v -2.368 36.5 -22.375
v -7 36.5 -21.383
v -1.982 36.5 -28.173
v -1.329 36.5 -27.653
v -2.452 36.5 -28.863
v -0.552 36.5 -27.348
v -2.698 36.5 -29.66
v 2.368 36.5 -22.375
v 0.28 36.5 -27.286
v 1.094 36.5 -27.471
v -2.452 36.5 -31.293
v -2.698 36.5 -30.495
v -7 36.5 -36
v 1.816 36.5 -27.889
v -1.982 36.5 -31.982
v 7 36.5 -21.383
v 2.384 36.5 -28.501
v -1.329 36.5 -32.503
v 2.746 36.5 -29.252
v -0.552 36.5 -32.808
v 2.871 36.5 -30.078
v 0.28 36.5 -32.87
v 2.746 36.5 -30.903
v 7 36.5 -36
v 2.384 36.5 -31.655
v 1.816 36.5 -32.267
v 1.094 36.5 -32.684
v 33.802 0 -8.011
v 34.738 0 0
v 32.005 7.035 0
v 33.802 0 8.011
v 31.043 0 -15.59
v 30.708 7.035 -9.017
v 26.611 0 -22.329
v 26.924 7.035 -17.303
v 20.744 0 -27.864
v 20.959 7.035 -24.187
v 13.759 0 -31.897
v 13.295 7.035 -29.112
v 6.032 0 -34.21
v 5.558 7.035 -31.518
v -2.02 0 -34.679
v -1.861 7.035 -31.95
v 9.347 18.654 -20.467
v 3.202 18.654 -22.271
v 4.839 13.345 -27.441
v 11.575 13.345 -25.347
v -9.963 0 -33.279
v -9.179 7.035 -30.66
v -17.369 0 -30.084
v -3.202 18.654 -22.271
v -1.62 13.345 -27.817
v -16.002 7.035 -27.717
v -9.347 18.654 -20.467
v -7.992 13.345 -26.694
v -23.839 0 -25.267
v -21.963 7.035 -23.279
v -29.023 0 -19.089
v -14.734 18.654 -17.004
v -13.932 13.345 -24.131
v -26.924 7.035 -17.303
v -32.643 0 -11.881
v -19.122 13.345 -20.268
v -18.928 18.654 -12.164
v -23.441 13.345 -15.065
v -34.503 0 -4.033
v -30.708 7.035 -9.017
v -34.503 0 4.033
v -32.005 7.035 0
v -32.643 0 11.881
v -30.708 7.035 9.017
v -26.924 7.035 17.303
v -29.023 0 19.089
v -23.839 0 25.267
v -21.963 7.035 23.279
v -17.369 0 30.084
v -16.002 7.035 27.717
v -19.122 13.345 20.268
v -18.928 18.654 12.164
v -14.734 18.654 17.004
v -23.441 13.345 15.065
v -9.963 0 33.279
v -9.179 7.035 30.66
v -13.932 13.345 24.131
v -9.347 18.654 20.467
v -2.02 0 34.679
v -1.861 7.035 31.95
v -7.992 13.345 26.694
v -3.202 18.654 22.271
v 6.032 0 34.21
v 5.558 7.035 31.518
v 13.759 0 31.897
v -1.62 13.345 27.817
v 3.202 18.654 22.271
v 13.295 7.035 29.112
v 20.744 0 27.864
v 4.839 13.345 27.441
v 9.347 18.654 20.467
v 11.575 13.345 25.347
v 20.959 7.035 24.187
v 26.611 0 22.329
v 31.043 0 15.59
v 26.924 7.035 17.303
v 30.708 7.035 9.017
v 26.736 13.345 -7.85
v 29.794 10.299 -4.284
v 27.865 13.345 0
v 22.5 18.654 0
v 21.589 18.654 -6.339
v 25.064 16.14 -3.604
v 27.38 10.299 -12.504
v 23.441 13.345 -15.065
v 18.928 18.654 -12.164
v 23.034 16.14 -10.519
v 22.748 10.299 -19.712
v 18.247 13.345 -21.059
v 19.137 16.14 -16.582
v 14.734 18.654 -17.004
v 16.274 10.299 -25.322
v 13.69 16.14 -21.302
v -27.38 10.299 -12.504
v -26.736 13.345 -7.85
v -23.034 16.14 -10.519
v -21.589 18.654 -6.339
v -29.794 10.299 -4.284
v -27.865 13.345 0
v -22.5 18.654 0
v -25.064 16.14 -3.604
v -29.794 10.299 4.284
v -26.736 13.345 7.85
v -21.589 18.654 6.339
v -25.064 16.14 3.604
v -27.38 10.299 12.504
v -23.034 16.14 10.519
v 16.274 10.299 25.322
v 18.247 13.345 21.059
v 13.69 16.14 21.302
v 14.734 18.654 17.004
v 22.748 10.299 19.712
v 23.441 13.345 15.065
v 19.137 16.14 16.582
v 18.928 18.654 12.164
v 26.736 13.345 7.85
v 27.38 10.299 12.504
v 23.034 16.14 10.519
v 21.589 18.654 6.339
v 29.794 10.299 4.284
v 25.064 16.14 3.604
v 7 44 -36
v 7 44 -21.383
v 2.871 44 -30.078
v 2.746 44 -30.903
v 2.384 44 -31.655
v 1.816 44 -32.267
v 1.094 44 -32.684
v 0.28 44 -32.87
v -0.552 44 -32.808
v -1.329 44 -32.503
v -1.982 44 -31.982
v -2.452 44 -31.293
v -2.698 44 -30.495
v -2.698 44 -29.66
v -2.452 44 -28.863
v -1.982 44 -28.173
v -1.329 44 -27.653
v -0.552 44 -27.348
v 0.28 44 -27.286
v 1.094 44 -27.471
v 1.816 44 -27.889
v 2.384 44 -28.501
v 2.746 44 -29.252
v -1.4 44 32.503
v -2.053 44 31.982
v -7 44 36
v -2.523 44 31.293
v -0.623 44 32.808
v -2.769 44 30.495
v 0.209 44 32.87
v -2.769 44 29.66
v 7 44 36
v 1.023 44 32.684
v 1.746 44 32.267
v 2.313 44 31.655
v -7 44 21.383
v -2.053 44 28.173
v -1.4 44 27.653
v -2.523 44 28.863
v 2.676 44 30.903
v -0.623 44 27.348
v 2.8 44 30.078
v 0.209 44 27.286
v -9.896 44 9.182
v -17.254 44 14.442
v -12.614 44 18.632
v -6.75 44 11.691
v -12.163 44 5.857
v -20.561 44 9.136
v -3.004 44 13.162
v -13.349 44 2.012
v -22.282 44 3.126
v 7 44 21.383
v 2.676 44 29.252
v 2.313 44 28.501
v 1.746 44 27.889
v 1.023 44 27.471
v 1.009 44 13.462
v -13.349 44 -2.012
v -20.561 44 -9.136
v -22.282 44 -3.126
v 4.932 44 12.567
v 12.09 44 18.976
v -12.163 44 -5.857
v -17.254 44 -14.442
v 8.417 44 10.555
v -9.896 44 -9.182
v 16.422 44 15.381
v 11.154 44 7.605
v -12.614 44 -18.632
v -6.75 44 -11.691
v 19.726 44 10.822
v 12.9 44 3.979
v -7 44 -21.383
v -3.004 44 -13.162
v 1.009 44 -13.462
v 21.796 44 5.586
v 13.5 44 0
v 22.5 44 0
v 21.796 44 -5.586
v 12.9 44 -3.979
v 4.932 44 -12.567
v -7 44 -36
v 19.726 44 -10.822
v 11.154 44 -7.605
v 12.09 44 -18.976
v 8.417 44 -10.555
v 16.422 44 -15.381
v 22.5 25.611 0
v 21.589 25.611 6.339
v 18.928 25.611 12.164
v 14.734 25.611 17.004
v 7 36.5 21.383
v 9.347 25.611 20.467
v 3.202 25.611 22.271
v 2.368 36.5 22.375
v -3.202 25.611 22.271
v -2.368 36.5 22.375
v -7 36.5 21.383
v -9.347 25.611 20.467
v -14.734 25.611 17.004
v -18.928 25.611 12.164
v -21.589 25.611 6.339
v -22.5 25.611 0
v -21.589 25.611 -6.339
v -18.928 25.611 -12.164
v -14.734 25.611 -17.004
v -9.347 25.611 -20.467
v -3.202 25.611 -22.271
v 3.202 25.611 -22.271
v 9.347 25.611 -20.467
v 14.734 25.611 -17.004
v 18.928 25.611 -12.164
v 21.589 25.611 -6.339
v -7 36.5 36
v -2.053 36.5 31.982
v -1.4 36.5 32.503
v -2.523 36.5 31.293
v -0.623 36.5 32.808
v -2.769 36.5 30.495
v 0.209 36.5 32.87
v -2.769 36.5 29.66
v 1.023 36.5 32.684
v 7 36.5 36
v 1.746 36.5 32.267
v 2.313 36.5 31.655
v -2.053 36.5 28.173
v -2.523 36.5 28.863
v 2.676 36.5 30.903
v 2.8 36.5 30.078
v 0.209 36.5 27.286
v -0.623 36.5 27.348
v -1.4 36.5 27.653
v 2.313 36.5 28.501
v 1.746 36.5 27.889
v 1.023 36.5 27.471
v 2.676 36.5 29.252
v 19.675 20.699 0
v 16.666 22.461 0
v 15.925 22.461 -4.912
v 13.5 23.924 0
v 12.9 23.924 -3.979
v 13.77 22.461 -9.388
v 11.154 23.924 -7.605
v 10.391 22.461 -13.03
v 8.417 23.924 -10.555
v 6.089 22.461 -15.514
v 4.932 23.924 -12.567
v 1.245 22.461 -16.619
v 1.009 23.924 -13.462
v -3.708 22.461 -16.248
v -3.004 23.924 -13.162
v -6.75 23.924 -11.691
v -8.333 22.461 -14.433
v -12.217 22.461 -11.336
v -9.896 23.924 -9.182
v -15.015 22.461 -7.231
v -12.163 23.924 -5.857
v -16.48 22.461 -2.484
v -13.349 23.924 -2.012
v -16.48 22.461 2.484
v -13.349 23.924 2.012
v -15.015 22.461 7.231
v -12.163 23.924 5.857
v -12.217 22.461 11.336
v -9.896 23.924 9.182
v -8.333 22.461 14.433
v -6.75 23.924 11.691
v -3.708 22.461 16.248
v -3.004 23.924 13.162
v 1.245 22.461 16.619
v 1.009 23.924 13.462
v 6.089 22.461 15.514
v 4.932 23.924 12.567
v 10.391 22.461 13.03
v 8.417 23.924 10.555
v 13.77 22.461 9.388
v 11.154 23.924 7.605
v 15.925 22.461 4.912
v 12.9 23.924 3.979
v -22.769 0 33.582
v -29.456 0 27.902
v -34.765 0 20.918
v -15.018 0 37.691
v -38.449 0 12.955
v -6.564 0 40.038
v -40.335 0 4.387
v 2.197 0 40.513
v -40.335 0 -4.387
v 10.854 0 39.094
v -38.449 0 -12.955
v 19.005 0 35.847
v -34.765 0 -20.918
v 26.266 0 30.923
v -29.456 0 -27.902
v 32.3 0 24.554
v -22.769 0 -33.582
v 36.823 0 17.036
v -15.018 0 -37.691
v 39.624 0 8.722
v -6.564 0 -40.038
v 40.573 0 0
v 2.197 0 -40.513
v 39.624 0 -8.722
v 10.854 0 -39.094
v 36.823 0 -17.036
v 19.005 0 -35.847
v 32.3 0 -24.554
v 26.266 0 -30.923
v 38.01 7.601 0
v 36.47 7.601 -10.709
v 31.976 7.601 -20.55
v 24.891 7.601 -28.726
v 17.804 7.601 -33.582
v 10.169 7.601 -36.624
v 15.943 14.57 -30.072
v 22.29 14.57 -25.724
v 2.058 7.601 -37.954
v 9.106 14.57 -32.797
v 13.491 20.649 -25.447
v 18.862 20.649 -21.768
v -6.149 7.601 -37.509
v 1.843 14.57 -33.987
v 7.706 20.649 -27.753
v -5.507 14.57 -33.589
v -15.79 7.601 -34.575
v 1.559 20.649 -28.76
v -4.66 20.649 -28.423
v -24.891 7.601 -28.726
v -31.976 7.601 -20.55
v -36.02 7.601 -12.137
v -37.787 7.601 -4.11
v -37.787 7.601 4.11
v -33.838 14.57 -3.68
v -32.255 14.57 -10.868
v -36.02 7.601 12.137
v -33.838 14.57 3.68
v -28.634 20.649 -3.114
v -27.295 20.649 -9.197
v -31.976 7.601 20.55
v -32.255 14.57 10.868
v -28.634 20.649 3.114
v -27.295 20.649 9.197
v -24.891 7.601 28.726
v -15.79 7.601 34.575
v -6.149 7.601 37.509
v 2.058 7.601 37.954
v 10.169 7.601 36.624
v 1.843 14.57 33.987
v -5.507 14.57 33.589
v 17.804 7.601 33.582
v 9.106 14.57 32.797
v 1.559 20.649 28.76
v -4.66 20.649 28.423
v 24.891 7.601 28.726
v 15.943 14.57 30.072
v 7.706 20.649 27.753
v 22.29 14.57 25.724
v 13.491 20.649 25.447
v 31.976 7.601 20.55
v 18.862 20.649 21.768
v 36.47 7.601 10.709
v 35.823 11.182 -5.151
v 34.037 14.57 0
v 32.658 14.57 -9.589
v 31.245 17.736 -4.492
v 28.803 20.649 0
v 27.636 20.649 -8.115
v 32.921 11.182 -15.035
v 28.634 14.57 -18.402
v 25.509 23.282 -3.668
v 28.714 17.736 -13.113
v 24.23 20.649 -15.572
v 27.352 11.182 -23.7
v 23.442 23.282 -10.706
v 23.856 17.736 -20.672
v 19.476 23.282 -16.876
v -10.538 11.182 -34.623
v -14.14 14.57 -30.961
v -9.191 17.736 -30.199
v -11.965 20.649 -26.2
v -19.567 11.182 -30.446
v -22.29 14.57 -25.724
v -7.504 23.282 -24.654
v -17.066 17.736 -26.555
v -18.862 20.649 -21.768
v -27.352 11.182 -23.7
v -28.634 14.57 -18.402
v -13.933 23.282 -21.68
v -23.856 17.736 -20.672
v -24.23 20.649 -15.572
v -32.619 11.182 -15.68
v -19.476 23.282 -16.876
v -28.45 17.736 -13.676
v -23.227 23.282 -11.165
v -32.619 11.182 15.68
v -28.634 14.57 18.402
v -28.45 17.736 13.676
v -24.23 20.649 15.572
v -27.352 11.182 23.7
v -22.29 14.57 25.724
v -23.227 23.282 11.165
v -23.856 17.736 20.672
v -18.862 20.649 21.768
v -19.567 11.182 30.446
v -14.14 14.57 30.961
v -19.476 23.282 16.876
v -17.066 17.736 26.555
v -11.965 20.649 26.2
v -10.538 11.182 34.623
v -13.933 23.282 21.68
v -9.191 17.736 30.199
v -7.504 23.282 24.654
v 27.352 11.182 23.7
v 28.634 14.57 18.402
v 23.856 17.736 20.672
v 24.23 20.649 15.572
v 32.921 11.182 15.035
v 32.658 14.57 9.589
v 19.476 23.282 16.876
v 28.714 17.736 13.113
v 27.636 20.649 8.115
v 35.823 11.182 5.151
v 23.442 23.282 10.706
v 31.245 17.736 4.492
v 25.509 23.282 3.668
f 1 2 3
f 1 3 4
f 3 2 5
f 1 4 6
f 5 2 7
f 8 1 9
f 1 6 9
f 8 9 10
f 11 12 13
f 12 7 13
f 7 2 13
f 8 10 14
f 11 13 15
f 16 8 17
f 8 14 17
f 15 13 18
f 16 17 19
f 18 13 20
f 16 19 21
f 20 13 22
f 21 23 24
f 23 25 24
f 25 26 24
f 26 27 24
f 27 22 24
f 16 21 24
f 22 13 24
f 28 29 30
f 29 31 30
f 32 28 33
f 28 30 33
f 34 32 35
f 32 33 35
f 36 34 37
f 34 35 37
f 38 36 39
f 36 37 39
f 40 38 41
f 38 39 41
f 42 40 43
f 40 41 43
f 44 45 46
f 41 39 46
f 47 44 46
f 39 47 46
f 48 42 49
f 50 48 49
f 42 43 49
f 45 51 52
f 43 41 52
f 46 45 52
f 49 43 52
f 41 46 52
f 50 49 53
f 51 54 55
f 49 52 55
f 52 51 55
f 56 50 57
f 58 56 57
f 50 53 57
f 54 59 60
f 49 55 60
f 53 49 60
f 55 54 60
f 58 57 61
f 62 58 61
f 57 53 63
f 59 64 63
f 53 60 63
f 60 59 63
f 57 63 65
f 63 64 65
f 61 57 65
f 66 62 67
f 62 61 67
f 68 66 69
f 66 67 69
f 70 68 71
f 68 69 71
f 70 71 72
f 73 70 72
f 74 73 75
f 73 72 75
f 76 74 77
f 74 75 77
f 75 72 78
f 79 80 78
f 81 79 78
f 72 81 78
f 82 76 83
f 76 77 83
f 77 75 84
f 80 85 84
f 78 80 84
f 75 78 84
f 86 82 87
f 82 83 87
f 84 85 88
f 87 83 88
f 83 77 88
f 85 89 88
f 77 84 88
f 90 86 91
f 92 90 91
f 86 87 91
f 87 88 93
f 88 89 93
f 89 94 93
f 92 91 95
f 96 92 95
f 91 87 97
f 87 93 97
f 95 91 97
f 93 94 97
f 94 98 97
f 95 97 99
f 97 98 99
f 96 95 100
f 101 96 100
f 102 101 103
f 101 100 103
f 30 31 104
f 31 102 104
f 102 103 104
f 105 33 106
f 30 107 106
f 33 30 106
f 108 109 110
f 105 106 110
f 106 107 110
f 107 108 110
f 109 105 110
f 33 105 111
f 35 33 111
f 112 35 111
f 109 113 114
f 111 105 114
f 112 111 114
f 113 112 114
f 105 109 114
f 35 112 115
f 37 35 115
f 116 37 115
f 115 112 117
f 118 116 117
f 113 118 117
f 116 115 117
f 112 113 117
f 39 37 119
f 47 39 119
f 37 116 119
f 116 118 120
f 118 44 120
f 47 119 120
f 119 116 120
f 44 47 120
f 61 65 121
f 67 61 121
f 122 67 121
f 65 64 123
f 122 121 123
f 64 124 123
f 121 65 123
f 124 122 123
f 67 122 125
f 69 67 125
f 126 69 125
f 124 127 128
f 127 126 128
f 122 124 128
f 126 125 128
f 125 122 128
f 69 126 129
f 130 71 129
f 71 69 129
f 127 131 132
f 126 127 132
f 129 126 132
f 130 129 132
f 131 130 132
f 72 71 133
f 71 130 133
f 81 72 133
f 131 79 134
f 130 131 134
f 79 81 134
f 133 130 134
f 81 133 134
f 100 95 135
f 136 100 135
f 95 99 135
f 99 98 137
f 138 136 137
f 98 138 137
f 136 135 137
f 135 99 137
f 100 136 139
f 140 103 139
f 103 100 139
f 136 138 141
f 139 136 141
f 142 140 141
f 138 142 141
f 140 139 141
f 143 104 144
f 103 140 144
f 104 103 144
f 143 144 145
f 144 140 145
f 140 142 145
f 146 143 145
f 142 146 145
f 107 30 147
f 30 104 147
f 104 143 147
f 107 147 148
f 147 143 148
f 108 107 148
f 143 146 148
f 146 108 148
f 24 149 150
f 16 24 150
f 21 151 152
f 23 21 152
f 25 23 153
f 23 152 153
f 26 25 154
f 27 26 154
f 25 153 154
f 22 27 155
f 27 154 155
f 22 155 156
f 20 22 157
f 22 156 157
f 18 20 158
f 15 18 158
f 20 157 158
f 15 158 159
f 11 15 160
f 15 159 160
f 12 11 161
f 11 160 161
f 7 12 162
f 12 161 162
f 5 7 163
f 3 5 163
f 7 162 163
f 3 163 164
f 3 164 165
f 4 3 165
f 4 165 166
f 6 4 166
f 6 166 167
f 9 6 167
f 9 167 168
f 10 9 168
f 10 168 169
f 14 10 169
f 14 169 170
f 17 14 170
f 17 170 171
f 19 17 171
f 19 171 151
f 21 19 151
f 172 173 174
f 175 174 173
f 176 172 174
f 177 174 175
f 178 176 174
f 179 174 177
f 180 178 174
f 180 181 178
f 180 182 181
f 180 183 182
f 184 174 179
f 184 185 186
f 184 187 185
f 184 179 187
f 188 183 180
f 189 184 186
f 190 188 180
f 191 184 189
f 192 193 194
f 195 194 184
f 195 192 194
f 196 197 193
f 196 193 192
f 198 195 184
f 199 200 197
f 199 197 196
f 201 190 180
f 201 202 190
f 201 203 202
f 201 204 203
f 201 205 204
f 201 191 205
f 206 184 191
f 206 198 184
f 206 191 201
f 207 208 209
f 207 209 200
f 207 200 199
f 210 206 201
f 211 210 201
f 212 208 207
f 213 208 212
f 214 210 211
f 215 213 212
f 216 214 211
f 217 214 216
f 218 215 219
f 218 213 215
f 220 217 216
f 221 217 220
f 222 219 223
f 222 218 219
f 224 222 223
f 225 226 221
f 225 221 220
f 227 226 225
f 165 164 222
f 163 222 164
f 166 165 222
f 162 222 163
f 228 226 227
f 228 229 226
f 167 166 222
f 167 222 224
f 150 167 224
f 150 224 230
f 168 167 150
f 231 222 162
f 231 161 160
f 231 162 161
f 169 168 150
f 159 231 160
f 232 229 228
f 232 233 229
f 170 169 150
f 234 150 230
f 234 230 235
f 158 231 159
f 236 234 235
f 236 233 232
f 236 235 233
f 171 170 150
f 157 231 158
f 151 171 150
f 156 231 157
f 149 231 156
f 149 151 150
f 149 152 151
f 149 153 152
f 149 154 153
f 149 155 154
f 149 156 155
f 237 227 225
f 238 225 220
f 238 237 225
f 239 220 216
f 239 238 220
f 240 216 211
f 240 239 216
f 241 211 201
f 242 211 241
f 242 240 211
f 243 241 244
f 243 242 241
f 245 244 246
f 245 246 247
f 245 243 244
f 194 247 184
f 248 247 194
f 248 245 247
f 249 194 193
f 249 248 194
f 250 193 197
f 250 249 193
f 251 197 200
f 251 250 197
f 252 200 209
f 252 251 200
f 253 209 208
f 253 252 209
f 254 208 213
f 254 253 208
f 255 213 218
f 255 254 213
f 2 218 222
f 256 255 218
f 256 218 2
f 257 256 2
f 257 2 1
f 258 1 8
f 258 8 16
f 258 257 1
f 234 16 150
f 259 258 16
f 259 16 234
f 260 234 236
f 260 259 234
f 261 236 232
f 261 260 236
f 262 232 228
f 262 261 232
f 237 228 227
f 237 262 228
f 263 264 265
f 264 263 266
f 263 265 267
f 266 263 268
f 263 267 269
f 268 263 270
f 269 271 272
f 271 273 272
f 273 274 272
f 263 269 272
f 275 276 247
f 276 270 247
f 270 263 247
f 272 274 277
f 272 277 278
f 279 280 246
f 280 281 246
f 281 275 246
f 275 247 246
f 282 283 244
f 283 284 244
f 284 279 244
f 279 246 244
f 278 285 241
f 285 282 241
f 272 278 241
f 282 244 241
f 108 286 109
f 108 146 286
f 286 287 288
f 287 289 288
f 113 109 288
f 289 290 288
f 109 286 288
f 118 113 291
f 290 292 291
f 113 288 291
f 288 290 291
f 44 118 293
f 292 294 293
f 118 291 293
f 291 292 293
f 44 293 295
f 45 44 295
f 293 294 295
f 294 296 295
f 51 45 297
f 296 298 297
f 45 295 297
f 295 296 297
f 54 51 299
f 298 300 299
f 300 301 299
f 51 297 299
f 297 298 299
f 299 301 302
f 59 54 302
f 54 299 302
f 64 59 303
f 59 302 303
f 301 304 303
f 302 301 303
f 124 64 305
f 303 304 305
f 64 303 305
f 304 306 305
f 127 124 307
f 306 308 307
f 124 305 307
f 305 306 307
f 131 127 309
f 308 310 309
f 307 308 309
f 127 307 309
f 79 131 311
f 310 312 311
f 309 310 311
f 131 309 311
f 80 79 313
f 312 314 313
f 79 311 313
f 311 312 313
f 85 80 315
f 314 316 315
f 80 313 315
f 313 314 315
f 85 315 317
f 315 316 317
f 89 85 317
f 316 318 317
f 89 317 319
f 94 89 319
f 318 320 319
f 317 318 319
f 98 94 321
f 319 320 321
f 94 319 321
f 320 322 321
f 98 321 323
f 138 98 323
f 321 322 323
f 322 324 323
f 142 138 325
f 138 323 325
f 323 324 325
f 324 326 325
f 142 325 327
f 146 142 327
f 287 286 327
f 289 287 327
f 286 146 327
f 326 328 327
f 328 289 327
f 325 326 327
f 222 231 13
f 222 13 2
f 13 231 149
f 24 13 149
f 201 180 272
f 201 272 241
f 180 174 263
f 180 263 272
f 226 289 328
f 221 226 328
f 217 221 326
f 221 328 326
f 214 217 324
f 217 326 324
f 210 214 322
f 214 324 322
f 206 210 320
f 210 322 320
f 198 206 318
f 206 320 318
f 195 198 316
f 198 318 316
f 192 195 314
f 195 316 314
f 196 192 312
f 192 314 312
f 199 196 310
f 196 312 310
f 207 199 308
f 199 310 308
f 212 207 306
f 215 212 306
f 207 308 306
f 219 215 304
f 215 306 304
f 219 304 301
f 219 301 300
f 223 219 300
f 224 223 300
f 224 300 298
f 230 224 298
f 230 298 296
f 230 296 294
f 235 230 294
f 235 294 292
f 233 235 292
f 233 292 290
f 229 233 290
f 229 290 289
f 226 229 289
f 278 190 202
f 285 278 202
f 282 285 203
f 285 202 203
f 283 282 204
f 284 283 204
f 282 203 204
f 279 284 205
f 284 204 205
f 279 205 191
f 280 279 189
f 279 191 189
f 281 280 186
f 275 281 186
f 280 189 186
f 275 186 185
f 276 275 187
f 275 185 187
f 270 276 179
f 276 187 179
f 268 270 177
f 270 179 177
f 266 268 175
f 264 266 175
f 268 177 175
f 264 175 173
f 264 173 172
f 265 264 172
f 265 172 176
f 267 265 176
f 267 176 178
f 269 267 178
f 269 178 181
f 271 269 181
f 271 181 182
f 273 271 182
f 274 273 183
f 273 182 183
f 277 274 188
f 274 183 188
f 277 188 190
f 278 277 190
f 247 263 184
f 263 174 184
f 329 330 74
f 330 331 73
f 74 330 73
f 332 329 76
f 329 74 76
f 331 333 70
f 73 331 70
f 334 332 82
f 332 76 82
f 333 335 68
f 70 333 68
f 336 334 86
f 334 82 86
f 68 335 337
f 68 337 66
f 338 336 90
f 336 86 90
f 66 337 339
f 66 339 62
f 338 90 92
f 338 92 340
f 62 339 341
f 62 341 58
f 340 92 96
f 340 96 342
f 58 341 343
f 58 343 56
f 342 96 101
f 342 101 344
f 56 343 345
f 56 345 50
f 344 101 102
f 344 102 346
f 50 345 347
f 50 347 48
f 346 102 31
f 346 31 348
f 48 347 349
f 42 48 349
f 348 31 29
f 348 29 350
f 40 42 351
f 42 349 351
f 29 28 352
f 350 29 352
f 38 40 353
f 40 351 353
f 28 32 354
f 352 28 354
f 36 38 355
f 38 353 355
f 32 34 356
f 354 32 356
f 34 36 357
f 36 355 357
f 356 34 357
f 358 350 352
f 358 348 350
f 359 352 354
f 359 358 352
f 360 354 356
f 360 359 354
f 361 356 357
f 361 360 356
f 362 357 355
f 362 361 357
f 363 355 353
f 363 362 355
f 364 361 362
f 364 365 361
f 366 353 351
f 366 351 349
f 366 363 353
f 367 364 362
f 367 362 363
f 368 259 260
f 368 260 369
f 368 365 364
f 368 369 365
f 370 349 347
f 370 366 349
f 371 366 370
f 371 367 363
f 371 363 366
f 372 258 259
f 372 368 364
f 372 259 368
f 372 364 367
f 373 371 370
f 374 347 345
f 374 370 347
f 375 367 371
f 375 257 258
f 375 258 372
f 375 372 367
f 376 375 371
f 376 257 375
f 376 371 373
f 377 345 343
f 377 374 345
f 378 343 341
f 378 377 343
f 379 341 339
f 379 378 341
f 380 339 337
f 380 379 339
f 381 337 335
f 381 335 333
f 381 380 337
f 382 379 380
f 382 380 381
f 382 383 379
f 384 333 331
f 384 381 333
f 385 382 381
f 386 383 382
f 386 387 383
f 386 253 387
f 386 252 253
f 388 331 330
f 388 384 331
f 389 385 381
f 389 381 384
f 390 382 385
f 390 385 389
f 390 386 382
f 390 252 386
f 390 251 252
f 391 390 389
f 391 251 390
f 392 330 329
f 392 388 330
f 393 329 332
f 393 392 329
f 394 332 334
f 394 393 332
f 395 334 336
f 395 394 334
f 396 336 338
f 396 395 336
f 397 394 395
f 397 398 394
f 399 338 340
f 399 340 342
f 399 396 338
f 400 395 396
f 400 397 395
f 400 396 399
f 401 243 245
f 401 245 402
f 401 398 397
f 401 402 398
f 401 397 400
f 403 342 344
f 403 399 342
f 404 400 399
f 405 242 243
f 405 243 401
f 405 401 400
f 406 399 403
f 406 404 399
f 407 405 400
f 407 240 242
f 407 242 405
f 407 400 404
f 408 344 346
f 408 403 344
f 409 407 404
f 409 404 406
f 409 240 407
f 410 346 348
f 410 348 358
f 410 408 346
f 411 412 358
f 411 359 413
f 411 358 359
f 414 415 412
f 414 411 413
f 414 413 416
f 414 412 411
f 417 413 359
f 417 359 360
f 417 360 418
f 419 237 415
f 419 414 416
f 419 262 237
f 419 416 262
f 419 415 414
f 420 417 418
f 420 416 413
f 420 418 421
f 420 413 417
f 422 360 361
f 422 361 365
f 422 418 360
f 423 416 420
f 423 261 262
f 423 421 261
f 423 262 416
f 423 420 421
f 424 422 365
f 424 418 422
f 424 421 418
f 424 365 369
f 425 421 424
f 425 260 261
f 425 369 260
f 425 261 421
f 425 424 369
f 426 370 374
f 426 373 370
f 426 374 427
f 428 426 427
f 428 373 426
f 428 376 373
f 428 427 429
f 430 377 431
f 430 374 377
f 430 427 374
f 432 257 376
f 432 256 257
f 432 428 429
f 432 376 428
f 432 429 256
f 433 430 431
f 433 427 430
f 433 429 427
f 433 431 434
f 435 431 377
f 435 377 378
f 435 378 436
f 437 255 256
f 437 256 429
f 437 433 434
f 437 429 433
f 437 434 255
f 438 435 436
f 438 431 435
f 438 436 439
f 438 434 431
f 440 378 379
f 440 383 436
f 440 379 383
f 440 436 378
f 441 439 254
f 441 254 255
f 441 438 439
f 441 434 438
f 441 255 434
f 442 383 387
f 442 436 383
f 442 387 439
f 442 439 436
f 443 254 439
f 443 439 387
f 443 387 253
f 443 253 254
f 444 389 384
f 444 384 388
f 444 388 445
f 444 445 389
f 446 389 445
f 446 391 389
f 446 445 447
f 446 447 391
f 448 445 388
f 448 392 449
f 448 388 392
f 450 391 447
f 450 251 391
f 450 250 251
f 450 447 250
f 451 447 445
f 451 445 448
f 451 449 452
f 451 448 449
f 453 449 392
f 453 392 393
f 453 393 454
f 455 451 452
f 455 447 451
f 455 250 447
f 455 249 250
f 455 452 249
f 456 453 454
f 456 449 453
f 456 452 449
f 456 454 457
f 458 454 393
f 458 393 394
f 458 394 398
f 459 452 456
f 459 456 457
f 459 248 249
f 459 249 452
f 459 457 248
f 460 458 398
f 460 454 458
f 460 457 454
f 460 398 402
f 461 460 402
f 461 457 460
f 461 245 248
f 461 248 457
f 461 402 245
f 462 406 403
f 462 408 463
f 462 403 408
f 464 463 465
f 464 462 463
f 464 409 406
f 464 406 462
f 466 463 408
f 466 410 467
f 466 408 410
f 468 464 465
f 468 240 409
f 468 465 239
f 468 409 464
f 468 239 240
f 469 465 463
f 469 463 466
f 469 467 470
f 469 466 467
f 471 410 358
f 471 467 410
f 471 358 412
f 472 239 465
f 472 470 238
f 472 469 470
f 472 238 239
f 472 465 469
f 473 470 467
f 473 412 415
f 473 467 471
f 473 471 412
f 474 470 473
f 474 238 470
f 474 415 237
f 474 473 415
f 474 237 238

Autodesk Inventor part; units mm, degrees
ref_plane "YZ Plane" through (0, 0, 0) normal (1, 0, 0) x (0, 1, 0)
ref_plane "XZ Plane" through (0, 0, 0) normal (0, 1, 0) x (-1, 0, 0)
ref_plane "XY Plane" through (0, 0, 0) normal (0, 0, 1) x (1, 0, 0)
sketch "Sketch1" plane through (0, 0, 0) normal (0, 0, 1) x (1, 0, 0)
  line L0 (22.5, 44) -> (22.5, 25.6111)
  line L1 (13.5, 44) -> (13.5, 29.9618)
  arc A0 (22.5, 18.6538) -> (13.5, 23.9242) centre (0, -9.4487) ccw
  arc A1 (34.7379, 0) -> (22.5, 18.6538) centre (0, -9.4487) ccw
  arc A2 (40.5729, 0) -> (22.5, 25.6111) centre (0, -9.4487) ccw
  line L2 (13.5, 29.9618) -> (13.5, 23.9242)
  line L3 (13.5, 44) -> (22.5, 44)
  line L4 (34.7379, 0) -> (40.5729, 0)
  line L5 (0, -20.1384) -> (0, 54.6897) projected
  point P0 (0, 0)
revolve "Revolution1" add sketch "Sketch1" angle 360 about axis through (0, -10, 0) along (0, 1, 0)
sketch "Sketch2" plane through (0, 44, 0) normal (0, 1, 0) x (1, 0, 0)
  line L0 (-7, -13.5) -> (-7, -36)
  line L1 (-7, -36) -> (7, -36)
  line L2 (7, -36) -> (7, -13.5)
  line L3 (7, -13.5) -> (7, -11.5434)
  circle A0 centre (0, 0) radius 13.5 projected
  line L4 (-7, -13.5) -> (-7, -11.5434)
  line L5 (-7, 13.5) -> (-7, 36)
  line L6 (-7, 36) -> (7, 36)
  line L7 (7, 36) -> (7, 13.5)
  line L8 (-7, 13.5) -> (-7, 11.5434)
  line L9 (7, 13.5) -> (7, 11.5434)
  dimension "d12" = 14
  dimension "d13" = 22.5
  dimension "d16" = 14
  dimension "d17" = 22.5
extrude "Extrusion1" add sketch "Sketch2" against normal blind 7.5 contours L4 A0 L3 L2 L1 L0 | L8 L5 L6 L7 L9 A0
sketch "Sketch3" plane through (-7, 44, -36) normal (0, 1, 0) x (1, 0, 0)
  circle A0 centre (7, -66.0778) radius 2.8
  circle A1 centre (7.0706, -5.9222) radius 2.8
  line L0 (14, -14.6166) -> (14, 0) projected
  point P0 (7, -36)
  dimension "d20" = 5.6
  dimension "d21" = 5.6
extrude "Extrusion2" cut sketch "Sketch3" against normal blind 7.5
properties part number "Vacuum Gripper"
